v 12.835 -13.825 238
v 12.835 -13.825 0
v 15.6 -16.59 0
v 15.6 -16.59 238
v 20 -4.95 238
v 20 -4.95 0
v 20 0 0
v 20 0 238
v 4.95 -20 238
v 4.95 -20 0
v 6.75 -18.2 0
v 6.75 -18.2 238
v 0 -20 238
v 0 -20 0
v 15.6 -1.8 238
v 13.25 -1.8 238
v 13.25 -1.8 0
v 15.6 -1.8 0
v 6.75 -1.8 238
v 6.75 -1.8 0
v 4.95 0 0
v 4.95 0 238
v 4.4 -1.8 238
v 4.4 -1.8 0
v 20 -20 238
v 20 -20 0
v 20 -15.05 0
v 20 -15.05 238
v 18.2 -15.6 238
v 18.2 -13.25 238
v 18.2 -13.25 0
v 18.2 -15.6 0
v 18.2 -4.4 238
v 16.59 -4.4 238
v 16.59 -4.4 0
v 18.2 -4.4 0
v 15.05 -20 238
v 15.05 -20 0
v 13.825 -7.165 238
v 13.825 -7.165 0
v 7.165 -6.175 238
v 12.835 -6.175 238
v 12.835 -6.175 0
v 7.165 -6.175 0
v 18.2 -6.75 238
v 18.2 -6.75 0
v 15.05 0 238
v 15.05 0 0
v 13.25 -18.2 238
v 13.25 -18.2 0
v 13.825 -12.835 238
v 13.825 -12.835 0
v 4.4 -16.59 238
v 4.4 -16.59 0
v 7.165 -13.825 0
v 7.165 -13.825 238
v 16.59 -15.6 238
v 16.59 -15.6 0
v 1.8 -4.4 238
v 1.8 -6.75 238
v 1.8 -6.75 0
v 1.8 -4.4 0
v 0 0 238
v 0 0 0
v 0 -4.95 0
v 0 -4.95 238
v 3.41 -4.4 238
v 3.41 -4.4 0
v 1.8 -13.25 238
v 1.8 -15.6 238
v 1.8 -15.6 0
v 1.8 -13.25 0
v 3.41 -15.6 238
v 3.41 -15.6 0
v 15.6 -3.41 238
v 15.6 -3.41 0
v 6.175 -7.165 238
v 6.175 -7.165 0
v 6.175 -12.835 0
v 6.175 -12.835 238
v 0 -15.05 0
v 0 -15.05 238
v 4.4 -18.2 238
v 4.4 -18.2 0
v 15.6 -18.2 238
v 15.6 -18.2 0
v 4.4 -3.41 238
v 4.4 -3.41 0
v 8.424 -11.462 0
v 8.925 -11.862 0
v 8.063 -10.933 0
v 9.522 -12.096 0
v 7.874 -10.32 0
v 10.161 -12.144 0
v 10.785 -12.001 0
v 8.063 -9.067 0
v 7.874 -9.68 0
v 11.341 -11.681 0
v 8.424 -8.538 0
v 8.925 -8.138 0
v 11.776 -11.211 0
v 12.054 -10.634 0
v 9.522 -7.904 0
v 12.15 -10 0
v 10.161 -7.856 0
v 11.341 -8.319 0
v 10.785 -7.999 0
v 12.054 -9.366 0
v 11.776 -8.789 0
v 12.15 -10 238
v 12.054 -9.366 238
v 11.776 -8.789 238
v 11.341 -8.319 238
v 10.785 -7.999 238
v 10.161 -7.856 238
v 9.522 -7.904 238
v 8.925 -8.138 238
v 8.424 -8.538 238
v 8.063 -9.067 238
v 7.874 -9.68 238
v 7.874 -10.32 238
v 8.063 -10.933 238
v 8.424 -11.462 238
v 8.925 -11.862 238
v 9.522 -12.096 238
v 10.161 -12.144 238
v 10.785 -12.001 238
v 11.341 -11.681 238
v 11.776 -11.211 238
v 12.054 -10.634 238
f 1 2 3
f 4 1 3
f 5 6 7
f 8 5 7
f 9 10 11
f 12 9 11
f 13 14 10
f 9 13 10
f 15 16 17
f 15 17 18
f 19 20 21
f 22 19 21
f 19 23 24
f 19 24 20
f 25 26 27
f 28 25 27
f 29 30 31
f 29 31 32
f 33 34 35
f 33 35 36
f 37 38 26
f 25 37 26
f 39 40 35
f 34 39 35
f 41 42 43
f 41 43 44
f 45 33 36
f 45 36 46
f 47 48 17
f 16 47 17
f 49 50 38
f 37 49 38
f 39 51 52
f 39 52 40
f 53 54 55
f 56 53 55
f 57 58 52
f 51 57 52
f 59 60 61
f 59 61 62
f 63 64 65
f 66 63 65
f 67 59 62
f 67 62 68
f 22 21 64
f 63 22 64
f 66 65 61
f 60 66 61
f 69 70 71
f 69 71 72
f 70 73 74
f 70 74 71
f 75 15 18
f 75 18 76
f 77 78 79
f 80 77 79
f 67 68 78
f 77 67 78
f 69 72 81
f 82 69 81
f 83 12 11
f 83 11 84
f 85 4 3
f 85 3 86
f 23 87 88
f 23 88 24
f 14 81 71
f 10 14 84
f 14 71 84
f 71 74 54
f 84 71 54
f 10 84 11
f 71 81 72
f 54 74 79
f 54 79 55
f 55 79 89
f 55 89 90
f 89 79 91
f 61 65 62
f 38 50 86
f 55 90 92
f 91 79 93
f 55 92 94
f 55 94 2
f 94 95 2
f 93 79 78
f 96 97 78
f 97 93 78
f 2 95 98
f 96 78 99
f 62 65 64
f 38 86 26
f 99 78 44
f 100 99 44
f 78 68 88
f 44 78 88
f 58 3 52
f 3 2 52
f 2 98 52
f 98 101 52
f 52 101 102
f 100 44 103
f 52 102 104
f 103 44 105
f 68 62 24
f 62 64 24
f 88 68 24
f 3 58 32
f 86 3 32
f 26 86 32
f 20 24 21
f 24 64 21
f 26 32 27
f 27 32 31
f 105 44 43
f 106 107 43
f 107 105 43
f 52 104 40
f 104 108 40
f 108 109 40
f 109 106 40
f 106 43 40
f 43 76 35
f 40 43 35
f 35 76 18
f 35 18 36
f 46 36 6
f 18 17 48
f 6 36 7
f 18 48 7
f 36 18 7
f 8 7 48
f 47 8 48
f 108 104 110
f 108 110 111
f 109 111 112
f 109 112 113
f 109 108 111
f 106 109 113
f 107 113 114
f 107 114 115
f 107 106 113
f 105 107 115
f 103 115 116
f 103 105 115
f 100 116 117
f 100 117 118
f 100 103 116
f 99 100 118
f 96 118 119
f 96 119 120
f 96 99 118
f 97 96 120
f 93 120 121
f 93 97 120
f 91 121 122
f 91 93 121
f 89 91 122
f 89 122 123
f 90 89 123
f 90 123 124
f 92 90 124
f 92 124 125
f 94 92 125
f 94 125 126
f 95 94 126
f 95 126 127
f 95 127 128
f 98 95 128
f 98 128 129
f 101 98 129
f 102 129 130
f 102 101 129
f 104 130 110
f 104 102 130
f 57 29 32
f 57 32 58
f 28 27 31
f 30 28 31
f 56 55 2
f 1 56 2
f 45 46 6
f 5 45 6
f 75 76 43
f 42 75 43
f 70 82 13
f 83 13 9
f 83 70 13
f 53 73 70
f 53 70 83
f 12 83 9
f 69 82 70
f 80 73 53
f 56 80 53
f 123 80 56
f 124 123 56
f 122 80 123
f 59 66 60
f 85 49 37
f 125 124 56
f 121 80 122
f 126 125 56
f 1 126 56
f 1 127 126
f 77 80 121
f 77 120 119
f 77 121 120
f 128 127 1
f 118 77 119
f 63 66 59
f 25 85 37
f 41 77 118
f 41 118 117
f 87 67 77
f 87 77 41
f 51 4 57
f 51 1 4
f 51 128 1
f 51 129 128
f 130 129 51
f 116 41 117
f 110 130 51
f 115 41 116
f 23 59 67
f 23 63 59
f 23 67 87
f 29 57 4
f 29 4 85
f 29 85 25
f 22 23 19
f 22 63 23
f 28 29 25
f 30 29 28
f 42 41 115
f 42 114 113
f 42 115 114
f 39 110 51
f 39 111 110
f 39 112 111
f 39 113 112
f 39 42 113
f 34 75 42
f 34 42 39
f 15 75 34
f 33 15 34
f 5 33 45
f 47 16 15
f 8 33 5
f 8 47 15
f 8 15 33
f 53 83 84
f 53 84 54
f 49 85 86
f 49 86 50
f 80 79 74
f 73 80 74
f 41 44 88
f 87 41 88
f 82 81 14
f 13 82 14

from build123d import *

# Parameters (mm, degrees)
CROQUIS1_R              = 2.15
SALIENTE_EXTRUIR2_DEPTH = 238


with BuildPart() as part:
    # Croquis1 → Saliente-Extruir2 (new body)
    with BuildSketch(Plane.XY):
        Polygon((4.4, 0), (0, 0), (0, -0.56736664), (0, -4.4), (0, -4.95), (1.8, -6.75), (1.8, -4.4), (3.410050506, -4.4), (6.175, -7.164949494), (6.175, -12.835050506), (3.410050506, -15.6), (1.8, -15.6), (1.8, -13.25), (0, -15.05), (0, -15.6), (0, -20), (4.4, -20), (4.95, -20), (6.75, -18.2), (4.4, -18.2), (4.4, -16.589949494), (7.164949494, -13.825), (12.835050506, -13.825), (15.6, -16.589949494), (15.6, -18.2), (13.25, -18.2), (15.05, -20), (15.6, -20), (18.2, -20), (20, -20), (20, -15.6), (20, -15.05), (18.2, -13.25), (18.2, -15.6), (16.589949494, -15.6), (13.825, -12.835050506), (13.825, -7.164949494), (16.589949494, -4.4), (18.2, -4.4), (18.2, -6.75), (20, -4.95), (20, -4.4), (20, 0), (15.6, 0), (15.05, 0), (13.25, -1.8), (15.6, -1.8), (15.6, -3.410050506), (12.835050506, -6.175), (7.164949494, -6.175), (4.4, -3.410050506), (4.4, -1.8), (6.75, -1.8), (4.95, 0), align=None)
        with Locations((10, -10)):
            Circle(CROQUIS1_R, mode=Mode.SUBTRACT)
    extrude(amount=SALIENTE_EXTRUIR2_DEPTH)


solid = part.part
